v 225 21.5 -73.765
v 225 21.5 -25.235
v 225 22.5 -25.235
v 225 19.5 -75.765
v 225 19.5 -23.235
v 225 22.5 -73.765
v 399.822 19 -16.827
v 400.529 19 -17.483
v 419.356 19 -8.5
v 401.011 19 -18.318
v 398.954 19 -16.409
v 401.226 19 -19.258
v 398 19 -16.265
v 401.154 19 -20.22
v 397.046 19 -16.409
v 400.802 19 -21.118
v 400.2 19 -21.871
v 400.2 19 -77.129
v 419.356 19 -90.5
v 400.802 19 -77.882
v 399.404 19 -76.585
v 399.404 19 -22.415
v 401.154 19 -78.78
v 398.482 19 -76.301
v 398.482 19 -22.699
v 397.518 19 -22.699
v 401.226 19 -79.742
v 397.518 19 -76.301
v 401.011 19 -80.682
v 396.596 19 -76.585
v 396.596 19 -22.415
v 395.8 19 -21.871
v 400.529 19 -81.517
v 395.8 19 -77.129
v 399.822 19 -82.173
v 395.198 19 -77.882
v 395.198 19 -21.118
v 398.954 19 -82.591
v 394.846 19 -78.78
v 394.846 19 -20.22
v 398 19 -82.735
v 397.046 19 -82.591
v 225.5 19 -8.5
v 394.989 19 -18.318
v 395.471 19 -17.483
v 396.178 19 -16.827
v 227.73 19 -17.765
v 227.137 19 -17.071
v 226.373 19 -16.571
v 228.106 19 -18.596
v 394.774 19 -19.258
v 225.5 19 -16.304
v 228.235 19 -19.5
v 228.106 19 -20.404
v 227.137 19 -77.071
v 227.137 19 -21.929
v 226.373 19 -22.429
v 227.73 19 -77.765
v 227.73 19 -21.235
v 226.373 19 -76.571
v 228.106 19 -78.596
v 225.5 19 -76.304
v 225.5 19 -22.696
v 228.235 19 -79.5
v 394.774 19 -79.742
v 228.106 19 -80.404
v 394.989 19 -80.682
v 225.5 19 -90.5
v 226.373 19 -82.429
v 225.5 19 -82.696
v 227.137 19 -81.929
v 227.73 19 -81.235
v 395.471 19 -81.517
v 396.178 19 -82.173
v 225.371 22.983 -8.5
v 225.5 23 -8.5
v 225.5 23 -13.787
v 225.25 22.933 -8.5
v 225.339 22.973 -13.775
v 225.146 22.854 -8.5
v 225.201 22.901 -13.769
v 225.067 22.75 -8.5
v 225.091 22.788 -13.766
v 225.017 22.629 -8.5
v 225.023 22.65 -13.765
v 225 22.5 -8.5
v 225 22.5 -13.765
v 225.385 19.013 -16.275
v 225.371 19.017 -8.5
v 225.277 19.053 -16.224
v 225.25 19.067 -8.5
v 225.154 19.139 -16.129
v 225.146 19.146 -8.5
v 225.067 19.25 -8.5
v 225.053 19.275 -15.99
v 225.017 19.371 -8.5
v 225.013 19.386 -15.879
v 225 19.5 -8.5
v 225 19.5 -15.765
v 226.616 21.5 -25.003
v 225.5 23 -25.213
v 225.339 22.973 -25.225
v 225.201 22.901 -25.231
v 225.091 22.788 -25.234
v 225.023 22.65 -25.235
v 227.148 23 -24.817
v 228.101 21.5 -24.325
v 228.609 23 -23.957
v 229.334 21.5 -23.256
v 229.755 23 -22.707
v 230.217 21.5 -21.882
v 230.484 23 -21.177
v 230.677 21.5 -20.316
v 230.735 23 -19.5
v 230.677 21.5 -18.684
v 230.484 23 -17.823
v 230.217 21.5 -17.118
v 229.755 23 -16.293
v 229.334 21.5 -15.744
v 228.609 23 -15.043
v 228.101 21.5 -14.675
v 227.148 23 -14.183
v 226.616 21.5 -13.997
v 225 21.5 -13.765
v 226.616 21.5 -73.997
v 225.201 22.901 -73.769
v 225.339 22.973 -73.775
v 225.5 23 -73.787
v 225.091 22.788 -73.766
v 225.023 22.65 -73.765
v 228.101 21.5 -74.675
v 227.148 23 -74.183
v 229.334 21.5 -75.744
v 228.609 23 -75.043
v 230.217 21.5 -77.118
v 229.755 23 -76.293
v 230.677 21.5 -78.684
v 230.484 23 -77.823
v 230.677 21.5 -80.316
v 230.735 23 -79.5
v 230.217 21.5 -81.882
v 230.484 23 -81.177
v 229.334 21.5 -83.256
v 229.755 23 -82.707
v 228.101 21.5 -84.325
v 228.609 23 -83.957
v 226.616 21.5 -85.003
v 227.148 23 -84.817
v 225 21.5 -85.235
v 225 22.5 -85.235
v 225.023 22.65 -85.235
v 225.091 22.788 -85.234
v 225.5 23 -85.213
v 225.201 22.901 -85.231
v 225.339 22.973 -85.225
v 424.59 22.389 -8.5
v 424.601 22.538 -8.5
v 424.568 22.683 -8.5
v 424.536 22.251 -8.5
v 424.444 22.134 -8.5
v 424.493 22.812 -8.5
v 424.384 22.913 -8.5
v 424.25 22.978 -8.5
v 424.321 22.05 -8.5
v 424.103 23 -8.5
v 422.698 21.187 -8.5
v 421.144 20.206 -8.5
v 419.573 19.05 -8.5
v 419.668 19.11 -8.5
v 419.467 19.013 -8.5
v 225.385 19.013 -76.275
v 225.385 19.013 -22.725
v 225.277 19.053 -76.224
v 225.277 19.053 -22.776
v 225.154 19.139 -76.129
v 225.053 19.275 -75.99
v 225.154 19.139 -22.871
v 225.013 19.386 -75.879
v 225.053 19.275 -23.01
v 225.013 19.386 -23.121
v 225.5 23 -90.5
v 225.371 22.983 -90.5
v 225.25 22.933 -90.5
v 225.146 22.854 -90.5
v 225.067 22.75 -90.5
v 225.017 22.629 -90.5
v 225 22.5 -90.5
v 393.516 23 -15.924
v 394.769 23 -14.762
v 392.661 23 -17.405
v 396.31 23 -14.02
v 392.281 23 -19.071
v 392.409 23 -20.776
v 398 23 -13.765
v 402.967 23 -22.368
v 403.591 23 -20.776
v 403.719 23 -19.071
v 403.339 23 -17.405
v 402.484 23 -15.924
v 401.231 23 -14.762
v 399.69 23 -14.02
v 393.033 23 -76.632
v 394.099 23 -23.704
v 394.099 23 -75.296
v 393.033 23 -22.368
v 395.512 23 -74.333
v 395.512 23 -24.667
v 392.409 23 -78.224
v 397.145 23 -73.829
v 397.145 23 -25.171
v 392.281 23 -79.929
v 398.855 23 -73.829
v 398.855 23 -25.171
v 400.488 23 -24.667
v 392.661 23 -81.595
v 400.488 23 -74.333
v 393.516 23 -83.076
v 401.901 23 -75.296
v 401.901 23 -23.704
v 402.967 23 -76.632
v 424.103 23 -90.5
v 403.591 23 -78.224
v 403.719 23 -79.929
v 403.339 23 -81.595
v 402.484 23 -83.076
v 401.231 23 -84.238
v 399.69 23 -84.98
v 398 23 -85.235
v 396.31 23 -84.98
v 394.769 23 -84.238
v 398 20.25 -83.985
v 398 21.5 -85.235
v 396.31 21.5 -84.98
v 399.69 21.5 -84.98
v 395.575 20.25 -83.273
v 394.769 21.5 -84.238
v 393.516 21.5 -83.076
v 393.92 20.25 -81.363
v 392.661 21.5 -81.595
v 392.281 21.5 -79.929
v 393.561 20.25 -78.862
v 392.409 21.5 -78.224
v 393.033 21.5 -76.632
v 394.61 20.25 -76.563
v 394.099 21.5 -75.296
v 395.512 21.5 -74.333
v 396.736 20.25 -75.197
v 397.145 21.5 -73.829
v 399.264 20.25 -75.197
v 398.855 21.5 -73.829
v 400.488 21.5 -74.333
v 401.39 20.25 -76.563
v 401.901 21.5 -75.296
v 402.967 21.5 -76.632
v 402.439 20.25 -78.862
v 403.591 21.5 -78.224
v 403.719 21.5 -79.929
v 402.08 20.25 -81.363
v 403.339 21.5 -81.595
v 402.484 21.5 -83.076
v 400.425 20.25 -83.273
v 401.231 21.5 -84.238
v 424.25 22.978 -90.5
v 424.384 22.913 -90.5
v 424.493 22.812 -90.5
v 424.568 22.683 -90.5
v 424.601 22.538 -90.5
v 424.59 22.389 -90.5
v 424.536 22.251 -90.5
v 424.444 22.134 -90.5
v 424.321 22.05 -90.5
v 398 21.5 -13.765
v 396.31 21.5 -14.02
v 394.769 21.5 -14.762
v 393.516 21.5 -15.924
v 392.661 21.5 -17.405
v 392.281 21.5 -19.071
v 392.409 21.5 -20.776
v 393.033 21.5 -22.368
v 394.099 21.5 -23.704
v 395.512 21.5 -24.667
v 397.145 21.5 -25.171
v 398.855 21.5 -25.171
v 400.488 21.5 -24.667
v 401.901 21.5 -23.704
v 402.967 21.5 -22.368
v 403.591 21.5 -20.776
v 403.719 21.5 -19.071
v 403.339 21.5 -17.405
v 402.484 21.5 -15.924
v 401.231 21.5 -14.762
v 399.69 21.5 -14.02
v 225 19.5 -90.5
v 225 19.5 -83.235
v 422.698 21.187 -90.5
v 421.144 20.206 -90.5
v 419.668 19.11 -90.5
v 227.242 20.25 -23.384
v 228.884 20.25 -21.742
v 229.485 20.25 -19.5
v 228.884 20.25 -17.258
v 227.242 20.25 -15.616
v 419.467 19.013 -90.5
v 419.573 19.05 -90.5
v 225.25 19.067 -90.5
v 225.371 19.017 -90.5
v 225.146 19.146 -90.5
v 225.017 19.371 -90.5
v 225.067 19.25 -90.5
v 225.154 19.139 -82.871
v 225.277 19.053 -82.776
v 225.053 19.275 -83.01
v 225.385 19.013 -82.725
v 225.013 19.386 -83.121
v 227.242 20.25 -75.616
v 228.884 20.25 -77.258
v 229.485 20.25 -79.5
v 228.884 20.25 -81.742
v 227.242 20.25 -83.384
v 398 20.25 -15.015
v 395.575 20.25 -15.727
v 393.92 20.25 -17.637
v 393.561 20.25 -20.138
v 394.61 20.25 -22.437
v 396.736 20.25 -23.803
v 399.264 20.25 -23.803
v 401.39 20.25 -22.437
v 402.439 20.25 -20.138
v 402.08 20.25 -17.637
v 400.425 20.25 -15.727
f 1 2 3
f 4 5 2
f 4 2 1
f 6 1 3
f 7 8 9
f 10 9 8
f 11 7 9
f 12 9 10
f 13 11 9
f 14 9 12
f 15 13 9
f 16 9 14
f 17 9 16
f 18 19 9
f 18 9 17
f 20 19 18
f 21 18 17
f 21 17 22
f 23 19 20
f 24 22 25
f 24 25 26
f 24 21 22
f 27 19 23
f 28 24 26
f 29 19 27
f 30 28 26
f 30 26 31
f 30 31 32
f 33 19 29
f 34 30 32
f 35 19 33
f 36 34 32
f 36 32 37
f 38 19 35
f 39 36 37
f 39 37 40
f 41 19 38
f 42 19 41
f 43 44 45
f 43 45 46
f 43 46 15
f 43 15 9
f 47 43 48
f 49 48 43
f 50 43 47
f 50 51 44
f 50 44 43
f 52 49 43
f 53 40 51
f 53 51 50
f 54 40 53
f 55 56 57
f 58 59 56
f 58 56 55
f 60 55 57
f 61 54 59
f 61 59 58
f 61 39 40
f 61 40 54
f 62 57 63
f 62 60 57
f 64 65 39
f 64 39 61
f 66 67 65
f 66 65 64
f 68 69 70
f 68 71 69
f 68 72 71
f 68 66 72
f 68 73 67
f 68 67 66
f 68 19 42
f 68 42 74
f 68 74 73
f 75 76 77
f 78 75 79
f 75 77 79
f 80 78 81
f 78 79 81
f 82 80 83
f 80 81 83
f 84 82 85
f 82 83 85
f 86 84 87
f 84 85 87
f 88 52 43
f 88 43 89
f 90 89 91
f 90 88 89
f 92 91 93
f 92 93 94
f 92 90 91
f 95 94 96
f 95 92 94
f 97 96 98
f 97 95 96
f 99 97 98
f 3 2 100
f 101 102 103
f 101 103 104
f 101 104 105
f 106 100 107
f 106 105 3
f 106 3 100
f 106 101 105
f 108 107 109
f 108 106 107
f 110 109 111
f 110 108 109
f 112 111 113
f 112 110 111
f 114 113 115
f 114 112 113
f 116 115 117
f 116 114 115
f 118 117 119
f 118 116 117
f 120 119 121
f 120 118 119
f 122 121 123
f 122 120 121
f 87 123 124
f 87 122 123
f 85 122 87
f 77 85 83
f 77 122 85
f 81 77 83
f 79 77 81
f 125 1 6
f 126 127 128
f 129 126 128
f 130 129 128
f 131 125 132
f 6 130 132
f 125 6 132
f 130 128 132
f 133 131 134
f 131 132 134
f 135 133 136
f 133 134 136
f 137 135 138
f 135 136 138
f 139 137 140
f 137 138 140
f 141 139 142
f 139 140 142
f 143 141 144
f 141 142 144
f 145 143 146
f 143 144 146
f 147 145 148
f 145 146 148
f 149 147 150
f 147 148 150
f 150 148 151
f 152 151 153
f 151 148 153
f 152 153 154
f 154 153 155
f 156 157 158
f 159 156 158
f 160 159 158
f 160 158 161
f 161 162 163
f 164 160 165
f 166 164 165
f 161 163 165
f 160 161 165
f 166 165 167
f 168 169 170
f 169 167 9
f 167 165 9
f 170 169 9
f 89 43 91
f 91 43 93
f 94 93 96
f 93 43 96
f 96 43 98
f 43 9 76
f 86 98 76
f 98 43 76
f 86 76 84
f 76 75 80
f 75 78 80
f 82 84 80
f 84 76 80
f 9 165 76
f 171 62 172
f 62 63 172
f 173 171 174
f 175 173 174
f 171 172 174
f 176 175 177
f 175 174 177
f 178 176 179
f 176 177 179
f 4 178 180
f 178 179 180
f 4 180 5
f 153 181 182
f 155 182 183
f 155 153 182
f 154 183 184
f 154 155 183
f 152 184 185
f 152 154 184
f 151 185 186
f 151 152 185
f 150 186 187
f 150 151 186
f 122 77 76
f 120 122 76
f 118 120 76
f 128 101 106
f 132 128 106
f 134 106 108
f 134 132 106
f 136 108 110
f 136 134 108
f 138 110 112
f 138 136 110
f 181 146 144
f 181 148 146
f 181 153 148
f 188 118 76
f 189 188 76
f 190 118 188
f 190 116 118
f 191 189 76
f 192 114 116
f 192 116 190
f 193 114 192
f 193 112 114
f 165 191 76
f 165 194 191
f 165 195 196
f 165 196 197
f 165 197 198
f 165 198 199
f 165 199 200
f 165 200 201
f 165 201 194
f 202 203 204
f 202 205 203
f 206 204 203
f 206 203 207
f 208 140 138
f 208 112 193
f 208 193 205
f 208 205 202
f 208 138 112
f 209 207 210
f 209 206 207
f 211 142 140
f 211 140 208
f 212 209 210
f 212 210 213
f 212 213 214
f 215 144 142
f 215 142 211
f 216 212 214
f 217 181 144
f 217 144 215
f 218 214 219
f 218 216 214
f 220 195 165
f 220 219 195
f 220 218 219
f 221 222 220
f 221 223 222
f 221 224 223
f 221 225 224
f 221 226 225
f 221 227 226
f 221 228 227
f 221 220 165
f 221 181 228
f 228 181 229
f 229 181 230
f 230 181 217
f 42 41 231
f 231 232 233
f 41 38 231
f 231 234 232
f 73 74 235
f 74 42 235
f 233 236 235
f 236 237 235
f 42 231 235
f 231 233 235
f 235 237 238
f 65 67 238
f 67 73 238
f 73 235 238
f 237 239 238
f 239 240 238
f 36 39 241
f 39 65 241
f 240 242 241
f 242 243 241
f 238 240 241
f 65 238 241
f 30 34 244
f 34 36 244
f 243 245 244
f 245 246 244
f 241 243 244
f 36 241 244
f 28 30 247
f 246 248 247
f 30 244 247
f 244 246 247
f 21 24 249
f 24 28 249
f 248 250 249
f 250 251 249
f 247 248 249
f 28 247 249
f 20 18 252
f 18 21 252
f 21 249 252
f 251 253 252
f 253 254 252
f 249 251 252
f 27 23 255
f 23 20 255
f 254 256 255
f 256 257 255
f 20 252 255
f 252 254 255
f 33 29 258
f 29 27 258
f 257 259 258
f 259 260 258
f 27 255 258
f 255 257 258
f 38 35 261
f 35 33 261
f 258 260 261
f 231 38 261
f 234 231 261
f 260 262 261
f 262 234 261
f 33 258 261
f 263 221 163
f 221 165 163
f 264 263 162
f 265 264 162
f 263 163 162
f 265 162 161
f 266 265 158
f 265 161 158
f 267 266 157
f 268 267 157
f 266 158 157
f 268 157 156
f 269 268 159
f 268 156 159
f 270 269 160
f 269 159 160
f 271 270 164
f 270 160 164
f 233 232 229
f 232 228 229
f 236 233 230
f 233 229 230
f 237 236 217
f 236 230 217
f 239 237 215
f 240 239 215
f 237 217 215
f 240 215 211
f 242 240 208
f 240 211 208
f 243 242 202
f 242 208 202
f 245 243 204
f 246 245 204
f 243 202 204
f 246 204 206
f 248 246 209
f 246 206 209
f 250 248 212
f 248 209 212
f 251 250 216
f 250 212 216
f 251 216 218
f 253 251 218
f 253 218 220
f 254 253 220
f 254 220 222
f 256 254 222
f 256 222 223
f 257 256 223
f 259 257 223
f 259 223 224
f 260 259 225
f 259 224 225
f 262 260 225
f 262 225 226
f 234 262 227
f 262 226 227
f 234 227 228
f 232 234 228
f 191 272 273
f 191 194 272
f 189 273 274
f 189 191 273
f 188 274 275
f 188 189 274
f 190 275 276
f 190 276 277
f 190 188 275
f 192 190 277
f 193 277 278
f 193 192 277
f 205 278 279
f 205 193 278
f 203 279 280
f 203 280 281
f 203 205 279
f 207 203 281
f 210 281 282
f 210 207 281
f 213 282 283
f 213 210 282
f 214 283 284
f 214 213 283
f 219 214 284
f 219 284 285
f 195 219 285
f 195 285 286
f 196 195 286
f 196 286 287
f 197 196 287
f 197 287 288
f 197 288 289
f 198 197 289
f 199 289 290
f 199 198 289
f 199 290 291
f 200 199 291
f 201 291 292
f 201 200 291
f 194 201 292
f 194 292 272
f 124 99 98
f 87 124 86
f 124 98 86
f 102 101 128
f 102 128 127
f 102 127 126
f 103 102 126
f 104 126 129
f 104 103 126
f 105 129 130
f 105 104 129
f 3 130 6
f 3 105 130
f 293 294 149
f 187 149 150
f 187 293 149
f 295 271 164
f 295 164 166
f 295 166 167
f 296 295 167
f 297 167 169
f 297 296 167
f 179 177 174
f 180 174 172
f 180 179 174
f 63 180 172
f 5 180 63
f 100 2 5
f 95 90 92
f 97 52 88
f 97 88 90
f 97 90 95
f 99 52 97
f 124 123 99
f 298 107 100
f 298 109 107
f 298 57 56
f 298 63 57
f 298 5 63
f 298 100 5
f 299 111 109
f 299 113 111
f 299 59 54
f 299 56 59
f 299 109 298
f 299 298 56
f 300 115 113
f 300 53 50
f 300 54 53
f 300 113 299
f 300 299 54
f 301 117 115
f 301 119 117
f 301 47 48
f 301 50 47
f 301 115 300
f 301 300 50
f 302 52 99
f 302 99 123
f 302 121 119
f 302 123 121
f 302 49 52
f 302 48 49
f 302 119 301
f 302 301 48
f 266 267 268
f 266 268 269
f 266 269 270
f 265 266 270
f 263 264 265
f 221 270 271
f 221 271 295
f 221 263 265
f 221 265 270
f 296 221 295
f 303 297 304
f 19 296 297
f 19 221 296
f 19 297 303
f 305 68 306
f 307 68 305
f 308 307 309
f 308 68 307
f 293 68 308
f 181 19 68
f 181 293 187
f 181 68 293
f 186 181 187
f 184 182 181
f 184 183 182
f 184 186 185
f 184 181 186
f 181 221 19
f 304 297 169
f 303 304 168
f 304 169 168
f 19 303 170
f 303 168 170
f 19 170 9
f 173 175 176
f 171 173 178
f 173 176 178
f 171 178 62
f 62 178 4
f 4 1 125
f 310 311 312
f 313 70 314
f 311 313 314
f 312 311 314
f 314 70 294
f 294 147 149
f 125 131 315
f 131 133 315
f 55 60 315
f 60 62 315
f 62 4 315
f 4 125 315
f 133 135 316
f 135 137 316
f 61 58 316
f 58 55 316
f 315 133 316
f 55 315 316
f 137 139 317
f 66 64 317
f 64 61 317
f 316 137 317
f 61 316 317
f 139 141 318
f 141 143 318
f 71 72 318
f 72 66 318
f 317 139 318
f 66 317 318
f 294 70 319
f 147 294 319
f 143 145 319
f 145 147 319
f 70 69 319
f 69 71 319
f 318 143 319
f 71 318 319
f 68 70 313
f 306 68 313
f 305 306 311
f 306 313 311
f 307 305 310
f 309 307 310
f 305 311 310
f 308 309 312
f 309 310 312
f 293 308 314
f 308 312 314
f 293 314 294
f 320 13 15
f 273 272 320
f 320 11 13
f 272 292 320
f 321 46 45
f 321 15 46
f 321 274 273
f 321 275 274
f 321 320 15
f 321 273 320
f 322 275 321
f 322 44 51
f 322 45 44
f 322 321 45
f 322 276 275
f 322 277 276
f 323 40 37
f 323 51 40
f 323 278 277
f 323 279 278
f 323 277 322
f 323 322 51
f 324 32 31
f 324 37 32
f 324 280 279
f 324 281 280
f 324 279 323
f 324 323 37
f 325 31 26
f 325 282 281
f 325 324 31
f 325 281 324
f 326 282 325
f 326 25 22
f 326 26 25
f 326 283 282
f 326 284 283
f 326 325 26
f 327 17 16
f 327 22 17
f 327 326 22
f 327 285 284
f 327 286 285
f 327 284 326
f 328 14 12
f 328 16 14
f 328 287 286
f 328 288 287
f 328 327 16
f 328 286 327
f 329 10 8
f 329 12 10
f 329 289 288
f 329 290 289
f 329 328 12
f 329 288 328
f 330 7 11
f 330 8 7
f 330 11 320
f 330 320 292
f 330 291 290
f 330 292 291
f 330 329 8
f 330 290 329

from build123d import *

# Parameters (mm, degrees)
AUFSATZ_LINEAR_START                        = -8.5
AUFSATZ_LINEAR_AUSTRAGEN1_DEPTH             = 41
VERRUNDUNG1_R                               = 0.5
FORMSENKUNG_F_R_M5_SENKSCHRAUBE_MIT_2_COUNT = 2
FORMSENKUNG_F_R_M5_SENKSCHRAUBE_MIT_2_PITCH = 173


with BuildPart() as part:
    # Skizze1 → Aufsatz-Linear austragen1 (new body)
    with BuildSketch(Plane.XY.offset(AUFSATZ_LINEAR_START)):
        with BuildLine():
            Line((225, 23), (426.559028492, 23))
            ThreePointArc((426.559028492, 23), (422.879511457, 21.29187069), (419.532291702, 19))
            Line((419.532291702, 19), (417.992648648, 19))
            Line((417.992648648, 19), (225, 19))
            Line((225, 19), (225, 23))
        make_face()
    extrude(amount=-AUFSATZ_LINEAR_AUSTRAGEN1_DEPTH)

    # Verrundung1
    verrundung1_edges = [part.edges().sort_by_distance(p)[0] for p in [
        (225, 23, -29),
        (426.559028492, 23, -29),
        (419.532291702, 19, -29),
        (225, 19, -29),
    ]]
    fillet(verrundung1_edges, radius=VERRUNDUNG1_R)

    # Skizze5 → Formsenkung für M5 Senkschraube mit Innensechskant1 (revolve, cut)
    with BuildSketch(Plane(origin=(398, 23, -19.5), x_dir=(0, 0, 1), z_dir=(1, 0, 0))):
        Polygon((0, 0), (0, 5.652366702), (2.75, 4), (2.75, 4.485), (5.735, 1.5), (5.735, 0), align=None)
    formsenkung_f_r_m5_senkschraube_mit_inne = revolve(axis=Axis((398, 29.35, -19.5), (0, -1, 0)), mode=Mode.SUBTRACT)

    # Formsenkung f_r M5 Senkschraube mit  2: Formsenkung für M5 Senkschraube mit Innensechskant1 ×2
    with Locations(*[(-i * FORMSENKUNG_F_R_M5_SENKSCHRAUBE_MIT_2_PITCH, 0, 0) for i in range(1, FORMSENKUNG_F_R_M5_SENKSCHRAUBE_MIT_2_COUNT)]):
        add(formsenkung_f_r_m5_senkschraube_mit_inne, mode=Mode.SUBTRACT)

    # Spiegeln1: part across plane


with BuildPart() as part_1:
    add(part.part)
    add(part.part.mirror(Plane(origin=(435, 0, -49.5), x_dir=(1, 0, 0), z_dir=(0, 0, 1))))


solid = part_1.part
